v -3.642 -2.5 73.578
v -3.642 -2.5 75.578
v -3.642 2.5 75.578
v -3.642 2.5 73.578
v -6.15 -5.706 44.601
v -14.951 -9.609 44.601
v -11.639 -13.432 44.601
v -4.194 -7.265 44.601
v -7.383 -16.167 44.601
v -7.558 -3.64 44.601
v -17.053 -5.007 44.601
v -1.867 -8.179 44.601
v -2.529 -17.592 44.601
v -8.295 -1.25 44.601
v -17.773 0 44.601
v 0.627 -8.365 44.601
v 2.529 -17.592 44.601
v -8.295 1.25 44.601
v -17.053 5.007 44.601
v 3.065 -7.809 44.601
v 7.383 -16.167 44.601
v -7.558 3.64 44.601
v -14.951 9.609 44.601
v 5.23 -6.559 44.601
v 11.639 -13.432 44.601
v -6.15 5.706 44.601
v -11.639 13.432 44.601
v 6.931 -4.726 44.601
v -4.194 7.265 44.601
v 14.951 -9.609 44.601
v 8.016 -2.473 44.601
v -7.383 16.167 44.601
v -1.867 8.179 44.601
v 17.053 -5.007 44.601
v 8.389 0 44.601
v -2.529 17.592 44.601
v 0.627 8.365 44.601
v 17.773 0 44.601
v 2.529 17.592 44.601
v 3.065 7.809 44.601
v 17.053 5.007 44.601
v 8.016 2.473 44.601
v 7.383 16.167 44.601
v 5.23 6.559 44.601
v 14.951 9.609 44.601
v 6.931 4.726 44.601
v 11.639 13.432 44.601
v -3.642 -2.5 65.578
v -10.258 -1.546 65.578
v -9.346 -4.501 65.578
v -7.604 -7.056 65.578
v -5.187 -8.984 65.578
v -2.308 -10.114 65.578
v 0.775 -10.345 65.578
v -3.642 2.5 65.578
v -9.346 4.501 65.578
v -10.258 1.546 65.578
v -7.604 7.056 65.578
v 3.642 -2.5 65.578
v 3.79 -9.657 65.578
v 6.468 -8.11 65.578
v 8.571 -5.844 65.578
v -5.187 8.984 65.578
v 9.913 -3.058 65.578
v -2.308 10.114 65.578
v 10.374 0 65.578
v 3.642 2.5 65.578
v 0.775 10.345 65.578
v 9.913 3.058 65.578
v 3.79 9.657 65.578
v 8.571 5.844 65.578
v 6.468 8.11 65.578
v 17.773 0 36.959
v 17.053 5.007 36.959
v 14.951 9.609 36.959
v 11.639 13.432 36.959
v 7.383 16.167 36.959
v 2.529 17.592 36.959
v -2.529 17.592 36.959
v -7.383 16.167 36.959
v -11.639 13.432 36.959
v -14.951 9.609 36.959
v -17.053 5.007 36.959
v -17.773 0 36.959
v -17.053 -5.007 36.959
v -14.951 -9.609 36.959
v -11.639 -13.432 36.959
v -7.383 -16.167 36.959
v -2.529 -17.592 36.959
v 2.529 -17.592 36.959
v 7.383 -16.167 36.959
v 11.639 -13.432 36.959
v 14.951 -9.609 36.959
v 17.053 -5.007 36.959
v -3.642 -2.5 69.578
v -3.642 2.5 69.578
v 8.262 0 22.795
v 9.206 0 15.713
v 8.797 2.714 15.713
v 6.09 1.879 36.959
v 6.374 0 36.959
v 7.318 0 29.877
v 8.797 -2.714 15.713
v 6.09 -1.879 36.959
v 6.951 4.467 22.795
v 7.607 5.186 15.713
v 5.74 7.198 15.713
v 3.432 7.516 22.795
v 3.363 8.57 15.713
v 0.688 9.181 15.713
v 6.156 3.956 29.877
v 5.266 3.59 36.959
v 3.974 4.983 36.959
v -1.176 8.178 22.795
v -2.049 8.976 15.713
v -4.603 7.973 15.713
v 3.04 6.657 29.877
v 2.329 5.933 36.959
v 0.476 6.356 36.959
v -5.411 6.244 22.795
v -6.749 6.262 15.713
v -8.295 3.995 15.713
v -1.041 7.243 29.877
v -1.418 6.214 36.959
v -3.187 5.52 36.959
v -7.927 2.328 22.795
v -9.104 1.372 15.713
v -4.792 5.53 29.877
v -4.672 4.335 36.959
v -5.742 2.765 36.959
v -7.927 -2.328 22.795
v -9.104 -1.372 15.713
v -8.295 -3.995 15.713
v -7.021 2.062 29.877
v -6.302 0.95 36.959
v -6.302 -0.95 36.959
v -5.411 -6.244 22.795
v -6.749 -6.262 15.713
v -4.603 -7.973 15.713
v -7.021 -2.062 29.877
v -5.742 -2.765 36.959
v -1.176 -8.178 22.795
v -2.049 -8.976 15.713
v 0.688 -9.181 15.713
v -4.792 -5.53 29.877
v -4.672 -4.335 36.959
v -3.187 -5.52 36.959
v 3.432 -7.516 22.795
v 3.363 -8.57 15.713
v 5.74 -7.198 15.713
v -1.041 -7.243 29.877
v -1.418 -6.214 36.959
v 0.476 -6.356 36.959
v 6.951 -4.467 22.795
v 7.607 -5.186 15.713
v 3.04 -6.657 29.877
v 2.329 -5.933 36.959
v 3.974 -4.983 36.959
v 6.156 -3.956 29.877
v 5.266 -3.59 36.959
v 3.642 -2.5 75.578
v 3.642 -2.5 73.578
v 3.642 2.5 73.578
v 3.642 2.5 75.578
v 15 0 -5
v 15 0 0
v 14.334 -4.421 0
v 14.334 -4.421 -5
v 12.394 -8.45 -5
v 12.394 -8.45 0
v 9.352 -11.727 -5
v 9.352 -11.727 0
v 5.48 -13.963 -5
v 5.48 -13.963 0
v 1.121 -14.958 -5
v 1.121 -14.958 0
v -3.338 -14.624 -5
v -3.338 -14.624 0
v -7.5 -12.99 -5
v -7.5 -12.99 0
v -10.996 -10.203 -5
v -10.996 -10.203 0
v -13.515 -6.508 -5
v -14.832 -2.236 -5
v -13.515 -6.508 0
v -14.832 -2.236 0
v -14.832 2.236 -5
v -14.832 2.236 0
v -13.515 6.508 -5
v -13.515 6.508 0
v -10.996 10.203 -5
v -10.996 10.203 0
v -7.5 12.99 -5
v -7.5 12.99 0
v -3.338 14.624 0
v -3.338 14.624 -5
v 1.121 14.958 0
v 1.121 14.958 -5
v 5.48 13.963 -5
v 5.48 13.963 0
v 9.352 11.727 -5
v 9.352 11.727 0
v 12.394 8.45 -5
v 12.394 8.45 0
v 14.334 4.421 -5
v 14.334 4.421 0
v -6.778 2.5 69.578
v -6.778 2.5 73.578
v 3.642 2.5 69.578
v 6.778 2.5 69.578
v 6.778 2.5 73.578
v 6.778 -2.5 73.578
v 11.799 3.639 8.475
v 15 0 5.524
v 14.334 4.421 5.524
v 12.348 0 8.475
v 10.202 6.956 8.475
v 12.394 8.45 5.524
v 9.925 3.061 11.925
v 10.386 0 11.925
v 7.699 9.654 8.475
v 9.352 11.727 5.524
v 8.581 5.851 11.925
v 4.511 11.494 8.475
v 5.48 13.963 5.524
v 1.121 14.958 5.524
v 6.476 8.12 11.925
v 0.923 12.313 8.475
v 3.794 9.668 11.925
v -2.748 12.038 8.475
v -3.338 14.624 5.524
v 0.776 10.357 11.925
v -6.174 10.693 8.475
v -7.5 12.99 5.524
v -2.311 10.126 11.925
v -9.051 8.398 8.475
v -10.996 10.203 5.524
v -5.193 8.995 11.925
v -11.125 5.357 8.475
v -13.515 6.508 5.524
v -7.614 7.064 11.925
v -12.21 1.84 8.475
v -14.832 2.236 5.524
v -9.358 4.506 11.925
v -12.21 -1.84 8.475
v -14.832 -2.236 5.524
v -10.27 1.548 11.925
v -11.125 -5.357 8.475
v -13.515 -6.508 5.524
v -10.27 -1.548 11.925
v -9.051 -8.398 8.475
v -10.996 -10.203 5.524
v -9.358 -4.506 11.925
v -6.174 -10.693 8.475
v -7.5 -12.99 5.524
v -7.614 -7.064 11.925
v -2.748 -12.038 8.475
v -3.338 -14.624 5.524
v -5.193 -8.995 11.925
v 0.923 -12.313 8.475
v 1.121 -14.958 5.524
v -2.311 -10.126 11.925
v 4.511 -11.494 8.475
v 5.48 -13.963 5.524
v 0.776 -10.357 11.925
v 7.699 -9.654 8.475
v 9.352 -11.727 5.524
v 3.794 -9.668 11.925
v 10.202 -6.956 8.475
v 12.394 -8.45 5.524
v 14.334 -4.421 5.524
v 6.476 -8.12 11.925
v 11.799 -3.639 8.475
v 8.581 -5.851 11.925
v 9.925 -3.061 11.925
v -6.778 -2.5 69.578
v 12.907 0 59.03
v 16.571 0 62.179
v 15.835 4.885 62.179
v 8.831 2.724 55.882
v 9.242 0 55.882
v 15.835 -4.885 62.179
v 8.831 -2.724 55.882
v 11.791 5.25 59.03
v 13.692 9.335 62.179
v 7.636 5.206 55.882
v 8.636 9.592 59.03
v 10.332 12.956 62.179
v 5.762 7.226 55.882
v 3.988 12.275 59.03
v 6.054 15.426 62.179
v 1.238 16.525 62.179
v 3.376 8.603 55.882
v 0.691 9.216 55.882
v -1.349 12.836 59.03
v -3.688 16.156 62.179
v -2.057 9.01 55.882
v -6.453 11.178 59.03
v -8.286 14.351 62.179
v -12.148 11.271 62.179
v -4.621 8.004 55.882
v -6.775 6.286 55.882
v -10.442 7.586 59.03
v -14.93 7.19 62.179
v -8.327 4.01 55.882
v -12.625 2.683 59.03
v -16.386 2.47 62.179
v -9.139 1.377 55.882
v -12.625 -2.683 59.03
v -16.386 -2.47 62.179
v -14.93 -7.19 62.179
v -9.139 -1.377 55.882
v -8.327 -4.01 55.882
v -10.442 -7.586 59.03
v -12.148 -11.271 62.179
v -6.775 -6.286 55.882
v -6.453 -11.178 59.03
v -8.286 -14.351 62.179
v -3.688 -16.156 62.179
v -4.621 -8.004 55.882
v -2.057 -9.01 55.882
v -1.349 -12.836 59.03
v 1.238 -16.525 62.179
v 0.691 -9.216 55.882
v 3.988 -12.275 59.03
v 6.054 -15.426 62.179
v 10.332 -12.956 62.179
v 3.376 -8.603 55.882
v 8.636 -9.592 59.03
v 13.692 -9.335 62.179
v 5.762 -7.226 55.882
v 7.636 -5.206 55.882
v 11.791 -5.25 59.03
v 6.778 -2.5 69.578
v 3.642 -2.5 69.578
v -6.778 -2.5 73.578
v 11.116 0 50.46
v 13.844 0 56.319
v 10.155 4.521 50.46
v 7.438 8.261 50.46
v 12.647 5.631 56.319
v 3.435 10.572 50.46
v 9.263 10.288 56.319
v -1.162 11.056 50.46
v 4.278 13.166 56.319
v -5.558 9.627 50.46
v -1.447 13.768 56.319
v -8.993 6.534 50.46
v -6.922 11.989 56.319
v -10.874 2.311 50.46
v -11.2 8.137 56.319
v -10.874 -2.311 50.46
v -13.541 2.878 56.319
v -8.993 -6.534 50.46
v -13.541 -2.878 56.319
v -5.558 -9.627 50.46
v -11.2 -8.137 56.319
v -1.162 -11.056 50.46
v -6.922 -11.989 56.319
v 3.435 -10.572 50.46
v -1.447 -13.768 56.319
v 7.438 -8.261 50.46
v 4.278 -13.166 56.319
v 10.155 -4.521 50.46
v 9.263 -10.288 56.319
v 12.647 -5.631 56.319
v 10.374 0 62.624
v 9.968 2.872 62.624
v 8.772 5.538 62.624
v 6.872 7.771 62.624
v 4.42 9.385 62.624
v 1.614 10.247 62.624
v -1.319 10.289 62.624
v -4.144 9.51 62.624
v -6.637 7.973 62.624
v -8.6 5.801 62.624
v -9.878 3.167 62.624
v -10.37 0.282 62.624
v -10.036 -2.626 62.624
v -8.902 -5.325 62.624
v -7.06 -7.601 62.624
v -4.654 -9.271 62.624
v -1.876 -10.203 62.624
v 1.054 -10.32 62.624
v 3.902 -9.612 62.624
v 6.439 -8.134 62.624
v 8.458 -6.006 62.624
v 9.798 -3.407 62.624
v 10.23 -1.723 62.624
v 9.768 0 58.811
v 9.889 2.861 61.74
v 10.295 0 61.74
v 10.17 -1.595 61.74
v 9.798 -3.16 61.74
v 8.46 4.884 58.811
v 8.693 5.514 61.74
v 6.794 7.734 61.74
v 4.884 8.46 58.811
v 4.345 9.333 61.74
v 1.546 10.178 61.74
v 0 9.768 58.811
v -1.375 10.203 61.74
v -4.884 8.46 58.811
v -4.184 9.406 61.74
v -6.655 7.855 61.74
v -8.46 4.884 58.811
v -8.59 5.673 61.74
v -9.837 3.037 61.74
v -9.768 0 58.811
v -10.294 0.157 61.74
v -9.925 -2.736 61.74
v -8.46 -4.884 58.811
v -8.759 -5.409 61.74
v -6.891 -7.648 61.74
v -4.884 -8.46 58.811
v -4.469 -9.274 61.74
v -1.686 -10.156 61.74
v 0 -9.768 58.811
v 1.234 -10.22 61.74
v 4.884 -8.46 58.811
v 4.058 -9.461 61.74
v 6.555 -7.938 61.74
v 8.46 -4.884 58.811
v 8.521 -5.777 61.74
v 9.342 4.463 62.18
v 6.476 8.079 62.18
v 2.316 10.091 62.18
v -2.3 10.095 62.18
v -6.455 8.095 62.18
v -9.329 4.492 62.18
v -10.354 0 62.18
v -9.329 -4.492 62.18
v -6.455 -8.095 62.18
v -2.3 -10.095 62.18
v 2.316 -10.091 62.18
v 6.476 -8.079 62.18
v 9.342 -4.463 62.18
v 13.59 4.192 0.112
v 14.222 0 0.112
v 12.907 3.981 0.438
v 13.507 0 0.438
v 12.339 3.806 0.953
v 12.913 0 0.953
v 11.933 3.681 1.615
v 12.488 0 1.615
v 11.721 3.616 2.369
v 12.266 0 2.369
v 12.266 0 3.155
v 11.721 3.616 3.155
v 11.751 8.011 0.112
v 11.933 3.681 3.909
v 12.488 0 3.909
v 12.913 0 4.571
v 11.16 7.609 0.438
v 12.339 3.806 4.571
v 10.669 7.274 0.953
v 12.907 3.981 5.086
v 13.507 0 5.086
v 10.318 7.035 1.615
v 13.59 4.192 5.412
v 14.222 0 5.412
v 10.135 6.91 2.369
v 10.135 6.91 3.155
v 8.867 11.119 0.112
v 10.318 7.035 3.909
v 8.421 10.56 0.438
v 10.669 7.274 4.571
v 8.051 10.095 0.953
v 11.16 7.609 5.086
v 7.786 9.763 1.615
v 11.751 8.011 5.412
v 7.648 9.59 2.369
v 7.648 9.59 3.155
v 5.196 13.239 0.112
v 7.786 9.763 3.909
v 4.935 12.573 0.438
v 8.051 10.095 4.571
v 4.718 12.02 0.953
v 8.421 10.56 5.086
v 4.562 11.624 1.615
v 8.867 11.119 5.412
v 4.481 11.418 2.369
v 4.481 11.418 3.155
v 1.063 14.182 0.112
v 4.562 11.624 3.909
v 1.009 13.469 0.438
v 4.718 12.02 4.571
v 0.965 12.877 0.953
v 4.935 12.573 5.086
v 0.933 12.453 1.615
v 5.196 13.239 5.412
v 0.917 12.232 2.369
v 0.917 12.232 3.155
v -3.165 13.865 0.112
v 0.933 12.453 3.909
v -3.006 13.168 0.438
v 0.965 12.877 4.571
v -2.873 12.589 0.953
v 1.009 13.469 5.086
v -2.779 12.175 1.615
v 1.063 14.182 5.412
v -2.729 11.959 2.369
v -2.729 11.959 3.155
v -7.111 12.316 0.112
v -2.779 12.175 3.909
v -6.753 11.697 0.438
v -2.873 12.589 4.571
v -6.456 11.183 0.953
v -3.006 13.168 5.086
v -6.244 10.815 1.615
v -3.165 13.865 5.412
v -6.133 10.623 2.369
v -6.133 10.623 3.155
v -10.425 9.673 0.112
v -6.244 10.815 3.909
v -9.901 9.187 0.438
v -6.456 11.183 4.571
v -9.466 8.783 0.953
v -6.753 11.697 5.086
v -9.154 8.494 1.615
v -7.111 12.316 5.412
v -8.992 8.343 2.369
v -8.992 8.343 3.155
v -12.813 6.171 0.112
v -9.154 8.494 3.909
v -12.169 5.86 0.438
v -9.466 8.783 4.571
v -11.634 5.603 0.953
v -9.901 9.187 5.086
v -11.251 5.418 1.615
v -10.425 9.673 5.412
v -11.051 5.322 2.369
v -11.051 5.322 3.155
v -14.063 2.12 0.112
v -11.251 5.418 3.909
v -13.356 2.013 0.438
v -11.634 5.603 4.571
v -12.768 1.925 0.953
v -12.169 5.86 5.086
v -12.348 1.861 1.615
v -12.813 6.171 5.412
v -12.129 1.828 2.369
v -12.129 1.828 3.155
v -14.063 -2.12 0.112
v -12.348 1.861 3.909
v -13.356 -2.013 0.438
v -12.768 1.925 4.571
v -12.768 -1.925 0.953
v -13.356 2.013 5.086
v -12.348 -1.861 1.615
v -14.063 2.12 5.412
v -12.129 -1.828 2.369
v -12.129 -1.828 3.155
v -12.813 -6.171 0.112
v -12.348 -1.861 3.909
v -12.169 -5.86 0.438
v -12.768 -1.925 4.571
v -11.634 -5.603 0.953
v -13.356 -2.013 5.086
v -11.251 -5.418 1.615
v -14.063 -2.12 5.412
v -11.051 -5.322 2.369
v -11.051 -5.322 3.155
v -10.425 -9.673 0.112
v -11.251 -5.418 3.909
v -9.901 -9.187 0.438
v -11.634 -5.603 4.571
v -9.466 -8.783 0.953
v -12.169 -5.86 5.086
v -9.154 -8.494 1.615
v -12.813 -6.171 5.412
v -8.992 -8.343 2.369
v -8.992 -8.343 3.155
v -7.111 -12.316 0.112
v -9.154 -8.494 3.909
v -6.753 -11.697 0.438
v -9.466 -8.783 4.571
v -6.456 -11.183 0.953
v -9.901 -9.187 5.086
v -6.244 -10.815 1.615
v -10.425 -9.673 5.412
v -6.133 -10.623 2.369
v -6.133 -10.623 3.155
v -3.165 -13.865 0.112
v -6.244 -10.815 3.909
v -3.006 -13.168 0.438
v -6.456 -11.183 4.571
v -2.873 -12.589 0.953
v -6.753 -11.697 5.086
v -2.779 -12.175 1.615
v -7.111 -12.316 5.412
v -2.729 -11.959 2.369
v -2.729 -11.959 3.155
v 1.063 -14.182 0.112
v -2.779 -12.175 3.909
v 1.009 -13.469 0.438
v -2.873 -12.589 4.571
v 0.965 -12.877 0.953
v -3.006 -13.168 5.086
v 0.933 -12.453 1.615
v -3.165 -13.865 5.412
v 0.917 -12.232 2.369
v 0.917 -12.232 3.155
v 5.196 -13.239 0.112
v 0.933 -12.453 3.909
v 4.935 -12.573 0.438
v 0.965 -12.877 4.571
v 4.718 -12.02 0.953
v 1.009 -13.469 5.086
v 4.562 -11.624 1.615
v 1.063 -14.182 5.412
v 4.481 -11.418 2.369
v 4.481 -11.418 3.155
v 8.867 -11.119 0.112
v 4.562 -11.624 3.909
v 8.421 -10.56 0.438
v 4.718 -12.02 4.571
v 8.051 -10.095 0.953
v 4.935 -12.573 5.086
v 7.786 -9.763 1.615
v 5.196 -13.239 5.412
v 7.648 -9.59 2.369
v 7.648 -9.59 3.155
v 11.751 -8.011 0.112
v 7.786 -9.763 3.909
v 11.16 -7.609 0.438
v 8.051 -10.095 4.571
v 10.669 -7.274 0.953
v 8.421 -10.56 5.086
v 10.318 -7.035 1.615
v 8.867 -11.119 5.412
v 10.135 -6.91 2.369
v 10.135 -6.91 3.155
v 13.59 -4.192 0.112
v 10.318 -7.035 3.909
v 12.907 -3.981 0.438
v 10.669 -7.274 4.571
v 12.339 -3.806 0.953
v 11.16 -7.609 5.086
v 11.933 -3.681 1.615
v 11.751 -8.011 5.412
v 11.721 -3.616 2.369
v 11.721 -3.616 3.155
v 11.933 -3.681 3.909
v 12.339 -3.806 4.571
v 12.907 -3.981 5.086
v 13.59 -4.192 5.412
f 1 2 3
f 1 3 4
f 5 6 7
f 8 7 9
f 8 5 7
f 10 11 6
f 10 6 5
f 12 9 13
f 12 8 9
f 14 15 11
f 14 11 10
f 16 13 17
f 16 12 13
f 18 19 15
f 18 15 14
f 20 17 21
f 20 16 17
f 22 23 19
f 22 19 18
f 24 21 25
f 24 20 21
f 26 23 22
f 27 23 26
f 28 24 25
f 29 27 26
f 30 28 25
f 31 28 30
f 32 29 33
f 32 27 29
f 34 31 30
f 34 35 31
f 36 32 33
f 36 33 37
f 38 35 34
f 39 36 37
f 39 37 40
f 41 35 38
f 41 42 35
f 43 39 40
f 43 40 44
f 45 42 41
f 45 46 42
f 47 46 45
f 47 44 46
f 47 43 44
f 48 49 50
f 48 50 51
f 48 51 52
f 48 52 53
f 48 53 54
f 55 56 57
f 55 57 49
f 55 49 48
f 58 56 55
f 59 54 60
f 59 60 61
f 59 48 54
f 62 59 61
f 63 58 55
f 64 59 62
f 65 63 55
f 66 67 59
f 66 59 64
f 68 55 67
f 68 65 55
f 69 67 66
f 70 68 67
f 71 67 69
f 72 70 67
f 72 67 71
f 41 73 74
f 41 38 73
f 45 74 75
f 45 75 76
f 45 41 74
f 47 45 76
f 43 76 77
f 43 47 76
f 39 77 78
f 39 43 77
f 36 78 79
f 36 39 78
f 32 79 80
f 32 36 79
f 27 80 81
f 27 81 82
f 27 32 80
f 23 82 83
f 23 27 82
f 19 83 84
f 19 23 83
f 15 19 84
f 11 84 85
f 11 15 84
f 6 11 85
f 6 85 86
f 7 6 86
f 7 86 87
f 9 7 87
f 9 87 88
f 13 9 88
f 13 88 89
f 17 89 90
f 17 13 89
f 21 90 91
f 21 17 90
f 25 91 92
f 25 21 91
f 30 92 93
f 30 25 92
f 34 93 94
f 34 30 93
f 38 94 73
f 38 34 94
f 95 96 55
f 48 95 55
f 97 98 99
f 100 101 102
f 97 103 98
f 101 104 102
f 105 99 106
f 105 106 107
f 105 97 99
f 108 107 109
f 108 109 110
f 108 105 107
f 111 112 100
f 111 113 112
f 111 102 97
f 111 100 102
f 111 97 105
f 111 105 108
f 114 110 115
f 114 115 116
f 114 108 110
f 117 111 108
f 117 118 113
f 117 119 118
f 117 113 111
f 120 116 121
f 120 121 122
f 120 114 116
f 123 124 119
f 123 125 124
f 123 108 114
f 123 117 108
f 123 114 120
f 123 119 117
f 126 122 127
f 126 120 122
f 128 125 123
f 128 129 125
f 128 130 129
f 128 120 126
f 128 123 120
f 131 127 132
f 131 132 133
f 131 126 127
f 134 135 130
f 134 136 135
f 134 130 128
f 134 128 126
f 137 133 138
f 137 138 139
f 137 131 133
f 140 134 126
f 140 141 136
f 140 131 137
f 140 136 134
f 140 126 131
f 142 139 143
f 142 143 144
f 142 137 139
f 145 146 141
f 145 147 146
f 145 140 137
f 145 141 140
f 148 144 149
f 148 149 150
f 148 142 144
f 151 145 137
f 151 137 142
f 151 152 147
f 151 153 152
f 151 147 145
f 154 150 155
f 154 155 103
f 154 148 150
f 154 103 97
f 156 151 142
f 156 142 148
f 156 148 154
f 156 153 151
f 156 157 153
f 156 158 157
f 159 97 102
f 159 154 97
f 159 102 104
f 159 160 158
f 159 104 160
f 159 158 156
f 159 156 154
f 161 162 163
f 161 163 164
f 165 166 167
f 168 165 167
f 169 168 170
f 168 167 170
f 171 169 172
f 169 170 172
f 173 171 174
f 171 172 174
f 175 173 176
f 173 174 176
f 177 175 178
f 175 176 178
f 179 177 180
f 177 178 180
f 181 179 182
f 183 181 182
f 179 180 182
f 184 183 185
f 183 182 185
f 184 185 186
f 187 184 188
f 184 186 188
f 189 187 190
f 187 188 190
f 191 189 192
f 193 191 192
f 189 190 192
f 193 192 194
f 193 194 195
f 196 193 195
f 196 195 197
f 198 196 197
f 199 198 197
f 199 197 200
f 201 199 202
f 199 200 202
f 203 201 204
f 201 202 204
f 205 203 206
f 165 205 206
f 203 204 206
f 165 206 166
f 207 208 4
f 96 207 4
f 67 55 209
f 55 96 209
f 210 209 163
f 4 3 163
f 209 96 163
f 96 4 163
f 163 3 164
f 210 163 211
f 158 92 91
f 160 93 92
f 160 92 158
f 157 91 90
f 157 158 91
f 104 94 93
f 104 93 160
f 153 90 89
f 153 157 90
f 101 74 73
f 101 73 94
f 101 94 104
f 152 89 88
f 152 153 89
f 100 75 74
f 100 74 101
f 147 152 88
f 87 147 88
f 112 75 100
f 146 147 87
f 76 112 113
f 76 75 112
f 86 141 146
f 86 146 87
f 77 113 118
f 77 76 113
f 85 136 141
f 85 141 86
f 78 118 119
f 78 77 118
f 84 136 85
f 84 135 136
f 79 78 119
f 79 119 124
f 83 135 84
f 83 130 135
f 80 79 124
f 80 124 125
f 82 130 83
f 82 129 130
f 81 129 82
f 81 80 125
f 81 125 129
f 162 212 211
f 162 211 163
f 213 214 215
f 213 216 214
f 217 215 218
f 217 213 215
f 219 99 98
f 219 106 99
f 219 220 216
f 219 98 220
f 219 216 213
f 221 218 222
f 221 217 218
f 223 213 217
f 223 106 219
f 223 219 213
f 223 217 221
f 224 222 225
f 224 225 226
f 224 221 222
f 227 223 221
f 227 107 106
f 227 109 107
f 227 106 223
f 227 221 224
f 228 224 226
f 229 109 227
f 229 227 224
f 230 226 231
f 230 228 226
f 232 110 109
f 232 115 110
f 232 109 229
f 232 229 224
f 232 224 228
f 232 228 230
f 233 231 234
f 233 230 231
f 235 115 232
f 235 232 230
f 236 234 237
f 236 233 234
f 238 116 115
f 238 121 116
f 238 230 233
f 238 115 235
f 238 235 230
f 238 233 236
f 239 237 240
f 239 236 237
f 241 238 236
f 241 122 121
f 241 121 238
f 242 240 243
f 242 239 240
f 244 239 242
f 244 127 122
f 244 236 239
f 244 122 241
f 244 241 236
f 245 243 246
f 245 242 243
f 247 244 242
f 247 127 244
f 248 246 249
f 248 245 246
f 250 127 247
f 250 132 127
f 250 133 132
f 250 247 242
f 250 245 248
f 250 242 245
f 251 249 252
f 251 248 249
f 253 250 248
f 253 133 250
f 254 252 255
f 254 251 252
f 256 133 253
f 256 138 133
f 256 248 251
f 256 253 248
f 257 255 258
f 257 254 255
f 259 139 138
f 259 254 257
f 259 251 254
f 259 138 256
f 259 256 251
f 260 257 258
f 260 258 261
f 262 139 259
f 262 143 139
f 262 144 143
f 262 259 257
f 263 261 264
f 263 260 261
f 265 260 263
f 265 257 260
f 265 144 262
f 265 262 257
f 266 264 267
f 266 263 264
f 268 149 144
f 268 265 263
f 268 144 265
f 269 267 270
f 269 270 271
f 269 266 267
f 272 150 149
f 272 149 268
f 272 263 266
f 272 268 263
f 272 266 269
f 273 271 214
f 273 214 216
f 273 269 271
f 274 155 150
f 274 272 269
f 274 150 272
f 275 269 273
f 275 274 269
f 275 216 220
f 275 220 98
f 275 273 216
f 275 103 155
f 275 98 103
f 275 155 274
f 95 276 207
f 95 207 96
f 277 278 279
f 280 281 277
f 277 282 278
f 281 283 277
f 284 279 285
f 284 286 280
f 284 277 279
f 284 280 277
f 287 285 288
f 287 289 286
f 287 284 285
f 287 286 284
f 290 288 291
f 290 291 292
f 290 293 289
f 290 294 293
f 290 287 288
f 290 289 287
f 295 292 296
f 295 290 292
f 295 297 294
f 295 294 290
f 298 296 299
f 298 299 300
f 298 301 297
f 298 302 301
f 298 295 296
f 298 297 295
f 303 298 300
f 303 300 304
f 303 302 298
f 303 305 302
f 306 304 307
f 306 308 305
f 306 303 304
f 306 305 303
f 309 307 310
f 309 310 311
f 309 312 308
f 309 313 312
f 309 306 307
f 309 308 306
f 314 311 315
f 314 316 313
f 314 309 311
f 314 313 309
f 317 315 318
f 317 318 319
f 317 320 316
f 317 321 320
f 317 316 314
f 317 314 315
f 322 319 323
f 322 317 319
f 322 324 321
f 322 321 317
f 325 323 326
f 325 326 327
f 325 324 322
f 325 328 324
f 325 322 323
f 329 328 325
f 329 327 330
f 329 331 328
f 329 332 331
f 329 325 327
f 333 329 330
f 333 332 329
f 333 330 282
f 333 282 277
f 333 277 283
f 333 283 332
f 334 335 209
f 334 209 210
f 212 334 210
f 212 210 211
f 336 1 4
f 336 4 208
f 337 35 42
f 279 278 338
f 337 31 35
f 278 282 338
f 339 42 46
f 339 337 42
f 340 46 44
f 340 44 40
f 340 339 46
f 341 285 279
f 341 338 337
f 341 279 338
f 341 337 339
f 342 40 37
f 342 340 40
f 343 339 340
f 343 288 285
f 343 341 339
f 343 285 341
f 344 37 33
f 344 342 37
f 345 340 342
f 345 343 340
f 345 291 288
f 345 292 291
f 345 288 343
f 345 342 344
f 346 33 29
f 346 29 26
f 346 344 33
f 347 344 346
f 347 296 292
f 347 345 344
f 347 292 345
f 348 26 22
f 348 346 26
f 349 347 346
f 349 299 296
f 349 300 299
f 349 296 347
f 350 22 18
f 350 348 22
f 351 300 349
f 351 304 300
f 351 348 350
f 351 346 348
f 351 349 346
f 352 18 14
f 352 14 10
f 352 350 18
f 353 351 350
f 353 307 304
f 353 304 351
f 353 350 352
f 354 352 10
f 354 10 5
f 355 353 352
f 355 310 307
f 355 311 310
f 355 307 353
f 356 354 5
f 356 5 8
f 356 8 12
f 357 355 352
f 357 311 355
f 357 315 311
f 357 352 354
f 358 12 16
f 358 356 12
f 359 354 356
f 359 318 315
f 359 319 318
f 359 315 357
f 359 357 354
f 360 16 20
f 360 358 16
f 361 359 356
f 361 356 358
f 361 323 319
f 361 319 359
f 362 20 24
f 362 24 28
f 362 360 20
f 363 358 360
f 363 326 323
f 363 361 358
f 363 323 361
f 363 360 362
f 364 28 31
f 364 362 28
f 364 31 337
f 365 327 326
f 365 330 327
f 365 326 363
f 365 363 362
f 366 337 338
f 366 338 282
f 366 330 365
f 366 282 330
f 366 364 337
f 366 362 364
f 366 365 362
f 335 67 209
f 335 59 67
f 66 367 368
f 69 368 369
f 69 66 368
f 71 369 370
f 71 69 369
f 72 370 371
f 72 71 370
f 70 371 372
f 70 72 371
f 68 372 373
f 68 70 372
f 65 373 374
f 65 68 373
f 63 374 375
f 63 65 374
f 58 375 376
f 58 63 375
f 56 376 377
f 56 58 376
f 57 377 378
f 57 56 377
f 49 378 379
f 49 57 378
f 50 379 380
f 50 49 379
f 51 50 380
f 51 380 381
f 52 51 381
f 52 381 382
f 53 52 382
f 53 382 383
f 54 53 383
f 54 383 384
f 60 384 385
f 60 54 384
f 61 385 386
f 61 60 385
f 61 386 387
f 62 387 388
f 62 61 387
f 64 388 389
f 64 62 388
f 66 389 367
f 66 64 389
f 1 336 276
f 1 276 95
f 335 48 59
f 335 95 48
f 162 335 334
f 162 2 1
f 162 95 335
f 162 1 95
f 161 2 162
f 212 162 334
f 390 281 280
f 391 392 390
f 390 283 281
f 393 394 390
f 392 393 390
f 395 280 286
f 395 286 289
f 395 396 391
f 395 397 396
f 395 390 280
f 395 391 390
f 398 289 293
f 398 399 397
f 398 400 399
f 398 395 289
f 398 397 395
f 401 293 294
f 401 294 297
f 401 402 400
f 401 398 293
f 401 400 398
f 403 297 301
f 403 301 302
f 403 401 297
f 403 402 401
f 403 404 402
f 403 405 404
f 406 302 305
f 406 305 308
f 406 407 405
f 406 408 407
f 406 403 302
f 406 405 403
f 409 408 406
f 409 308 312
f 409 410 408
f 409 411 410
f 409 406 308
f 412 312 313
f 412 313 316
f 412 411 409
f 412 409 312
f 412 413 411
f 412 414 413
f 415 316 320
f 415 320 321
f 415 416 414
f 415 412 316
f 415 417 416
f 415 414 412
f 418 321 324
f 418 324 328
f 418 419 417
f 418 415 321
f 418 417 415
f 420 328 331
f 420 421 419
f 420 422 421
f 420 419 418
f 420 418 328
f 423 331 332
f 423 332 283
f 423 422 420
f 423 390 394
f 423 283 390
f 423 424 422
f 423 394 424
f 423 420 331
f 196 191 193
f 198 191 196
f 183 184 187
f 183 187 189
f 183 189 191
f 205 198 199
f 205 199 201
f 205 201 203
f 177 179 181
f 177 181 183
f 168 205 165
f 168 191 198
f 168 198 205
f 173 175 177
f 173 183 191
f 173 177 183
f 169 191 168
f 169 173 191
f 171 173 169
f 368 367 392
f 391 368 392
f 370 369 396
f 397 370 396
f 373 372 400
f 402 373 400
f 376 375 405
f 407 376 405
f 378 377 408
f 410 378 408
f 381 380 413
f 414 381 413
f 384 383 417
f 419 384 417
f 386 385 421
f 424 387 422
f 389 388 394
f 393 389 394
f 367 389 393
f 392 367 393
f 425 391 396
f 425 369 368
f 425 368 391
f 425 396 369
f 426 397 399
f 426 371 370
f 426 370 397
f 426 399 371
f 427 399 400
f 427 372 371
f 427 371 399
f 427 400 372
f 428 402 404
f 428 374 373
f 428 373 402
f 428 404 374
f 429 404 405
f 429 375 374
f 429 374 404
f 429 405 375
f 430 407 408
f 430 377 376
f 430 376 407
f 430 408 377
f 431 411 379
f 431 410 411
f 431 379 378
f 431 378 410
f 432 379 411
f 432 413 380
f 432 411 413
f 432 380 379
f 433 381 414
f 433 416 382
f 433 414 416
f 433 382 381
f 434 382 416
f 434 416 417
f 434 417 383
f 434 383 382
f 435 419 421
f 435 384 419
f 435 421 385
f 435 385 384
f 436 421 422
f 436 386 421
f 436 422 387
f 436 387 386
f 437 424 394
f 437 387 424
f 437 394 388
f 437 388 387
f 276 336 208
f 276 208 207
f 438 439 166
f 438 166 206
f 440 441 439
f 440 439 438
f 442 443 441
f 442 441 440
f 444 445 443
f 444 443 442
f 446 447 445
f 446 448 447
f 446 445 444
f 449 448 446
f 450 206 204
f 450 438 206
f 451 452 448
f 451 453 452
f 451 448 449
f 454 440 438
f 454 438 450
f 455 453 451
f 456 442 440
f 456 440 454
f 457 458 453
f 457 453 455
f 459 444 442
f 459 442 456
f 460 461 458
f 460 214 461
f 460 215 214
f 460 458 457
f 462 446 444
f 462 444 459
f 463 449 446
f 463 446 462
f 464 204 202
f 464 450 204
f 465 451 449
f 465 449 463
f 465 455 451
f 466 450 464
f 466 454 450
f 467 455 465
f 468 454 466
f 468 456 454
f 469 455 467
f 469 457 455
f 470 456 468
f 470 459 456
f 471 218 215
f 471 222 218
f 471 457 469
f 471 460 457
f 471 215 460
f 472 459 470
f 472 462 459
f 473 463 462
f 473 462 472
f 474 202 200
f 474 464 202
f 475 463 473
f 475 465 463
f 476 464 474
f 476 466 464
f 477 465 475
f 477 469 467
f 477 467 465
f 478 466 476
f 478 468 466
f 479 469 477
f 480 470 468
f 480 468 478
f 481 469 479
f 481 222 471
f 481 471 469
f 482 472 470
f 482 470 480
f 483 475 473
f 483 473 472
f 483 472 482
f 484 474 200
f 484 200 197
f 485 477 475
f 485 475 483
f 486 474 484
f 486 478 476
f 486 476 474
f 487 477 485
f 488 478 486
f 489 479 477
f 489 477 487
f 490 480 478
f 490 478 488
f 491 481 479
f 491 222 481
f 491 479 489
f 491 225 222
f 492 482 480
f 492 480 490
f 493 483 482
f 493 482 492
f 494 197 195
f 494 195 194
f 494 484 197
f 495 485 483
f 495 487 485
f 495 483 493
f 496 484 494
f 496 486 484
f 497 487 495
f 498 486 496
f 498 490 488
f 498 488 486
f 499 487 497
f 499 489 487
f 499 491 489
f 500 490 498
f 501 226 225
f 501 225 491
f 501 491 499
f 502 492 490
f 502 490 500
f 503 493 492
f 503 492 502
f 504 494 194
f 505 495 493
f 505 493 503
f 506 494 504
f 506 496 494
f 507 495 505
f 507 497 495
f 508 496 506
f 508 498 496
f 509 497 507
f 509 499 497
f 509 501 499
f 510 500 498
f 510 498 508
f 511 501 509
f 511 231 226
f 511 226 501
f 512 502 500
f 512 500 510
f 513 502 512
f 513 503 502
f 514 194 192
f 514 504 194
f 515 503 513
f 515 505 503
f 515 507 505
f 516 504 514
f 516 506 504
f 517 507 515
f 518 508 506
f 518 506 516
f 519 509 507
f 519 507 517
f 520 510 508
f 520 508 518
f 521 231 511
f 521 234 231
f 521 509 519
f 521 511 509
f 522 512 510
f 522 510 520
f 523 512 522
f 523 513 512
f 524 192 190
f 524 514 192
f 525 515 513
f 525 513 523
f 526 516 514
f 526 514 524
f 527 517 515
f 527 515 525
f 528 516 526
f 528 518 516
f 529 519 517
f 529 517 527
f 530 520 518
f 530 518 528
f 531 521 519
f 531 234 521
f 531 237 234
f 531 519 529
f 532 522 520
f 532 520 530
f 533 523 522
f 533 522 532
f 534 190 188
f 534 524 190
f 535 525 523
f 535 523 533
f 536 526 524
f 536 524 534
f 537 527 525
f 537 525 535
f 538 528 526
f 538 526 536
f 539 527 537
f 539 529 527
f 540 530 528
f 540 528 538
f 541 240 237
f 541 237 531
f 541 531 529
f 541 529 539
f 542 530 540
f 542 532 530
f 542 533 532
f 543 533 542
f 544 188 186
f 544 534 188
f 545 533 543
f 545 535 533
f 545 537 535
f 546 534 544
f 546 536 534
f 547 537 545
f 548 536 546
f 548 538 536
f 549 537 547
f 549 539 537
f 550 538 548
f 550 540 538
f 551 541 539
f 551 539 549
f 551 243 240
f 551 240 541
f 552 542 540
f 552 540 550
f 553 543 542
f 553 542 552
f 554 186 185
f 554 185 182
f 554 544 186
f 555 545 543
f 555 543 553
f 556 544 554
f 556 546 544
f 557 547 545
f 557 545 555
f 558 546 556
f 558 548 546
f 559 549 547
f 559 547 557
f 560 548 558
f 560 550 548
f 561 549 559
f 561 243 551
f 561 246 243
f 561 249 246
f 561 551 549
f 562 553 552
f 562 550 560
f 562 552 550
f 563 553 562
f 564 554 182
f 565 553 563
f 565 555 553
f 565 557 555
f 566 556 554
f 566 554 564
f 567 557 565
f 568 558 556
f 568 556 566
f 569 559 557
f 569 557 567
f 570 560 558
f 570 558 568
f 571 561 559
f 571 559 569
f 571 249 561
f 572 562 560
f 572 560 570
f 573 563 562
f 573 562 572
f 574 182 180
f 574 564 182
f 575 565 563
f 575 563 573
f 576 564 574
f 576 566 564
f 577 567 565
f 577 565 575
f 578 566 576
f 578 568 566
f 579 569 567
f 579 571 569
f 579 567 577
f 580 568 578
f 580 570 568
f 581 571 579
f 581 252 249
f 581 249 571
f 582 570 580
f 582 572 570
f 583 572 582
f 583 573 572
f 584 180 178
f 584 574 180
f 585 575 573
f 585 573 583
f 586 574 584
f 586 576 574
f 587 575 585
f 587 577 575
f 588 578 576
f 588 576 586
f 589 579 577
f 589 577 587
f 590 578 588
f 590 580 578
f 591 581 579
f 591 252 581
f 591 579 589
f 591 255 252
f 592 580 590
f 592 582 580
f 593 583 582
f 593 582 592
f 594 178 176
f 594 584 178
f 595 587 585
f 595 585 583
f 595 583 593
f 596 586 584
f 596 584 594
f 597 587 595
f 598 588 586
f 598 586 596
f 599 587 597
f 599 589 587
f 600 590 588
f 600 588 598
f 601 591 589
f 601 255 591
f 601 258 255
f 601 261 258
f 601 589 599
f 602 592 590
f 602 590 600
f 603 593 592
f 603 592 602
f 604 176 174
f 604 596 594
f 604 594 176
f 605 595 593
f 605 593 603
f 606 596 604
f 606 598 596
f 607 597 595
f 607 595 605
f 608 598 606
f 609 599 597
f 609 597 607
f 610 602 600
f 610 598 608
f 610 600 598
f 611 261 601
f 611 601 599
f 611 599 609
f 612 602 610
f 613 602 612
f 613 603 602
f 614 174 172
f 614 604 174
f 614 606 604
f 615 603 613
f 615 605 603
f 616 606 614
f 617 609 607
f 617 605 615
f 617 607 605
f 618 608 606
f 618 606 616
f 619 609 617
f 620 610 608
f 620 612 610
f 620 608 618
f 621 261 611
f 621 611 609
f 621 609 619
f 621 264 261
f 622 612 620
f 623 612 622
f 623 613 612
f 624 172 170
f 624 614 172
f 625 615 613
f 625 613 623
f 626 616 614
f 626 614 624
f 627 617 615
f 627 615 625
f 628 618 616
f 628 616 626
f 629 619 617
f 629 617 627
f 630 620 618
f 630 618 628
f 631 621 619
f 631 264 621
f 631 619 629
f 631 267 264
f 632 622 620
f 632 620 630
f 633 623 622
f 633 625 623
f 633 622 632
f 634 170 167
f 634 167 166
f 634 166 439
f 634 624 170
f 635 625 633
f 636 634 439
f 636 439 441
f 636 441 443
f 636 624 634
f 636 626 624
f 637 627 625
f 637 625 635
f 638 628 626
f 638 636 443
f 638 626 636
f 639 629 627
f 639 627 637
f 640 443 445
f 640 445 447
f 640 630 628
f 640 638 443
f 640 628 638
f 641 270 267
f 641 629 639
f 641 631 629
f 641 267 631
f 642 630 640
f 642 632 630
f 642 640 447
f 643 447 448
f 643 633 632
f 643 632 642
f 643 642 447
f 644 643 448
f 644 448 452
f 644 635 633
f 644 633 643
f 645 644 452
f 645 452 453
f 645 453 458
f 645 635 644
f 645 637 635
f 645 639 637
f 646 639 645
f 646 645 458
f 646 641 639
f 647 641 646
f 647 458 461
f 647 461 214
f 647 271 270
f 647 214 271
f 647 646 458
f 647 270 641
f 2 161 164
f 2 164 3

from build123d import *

# Parameters (mm, degrees)
F1_FACE_R = 15
F2_DEPTH  = 5
F3_DEPTH  = 2.5
F4_DEPTH  = 2.5
F5_R      = 5


with BuildPart() as f1:
    # F0 (on Front) → F1 (revolve)
    with BuildSketch(Plane.XZ):
        with BuildLine():
            Line((0, 65.57779), (0, 0))
            Line((0, 0), (15, 0))
            ThreePointArc((15, 0), (12.238, 2.762), (15, 5.524))
            ThreePointArc((15, 5.524), (11.27401, 10.147038), (9.206386, 15.713044))
            Line((9.206386, 15.713044), (6.373653, 36.958547))
            Line((6.373653, 36.958547), (17.772784, 36.958547))
            Line((17.772784, 36.958547), (17.772784, 44.600636))
            Line((17.772784, 44.600636), (8.38892, 44.600636))
            Line((8.38892, 44.600636), (16.571492, 62.178511))
            Line((16.571492, 62.178511), (9.241848, 55.88216))
            Line((9.241848, 55.88216), (10.373653, 62.178511))
            Line((10.373653, 62.178511), (10.373653, 65.57779))
            Line((10.373653, 65.57779), (3.642126, 65.57779))
            Line((3.642126, 65.57779), (0, 65.57779))
        make_face()
    revolve(axis=Axis((0, 0, 32.788895), (0, 0, 1)))

    # F1_face (on face) → F2 (join)
    with BuildSketch(Plane(origin=(0, 0, 0), x_dir=(1, 0, 0), z_dir=(0, 0, -1))):
        Circle(F1_FACE_R)
    extrude(amount=F2_DEPTH)

    # F0 (on Front) → F3 (join)
    with BuildSketch(Plane.XZ):
        Polygon((-3.642126, 65.57779), (0, 65.57779), (3.642126, 65.57779), (3.642126, 69.57779), (6.778388, 69.57779), (6.778388, 73.57779), (3.642126, 73.57779), (3.642126, 75.57779), (0, 75.57779), (-3.642126, 75.57779), (-3.642126, 73.57779), (-6.778388, 73.57779), (-6.778388, 69.57779), (-3.642126, 69.57779), align=None)
    extrude(amount=F3_DEPTH)

    # F0 (on Front) → F4 (join)
    with BuildSketch(Plane.XZ):
        Polygon((-3.642126, 65.57779), (0, 65.57779), (3.642126, 65.57779), (3.642126, 69.57779), (6.778388, 69.57779), (6.778388, 73.57779), (3.642126, 73.57779), (3.642126, 75.57779), (0, 75.57779), (-3.642126, 75.57779), (-3.642126, 73.57779), (-6.778388, 73.57779), (-6.778388, 69.57779), (-3.642126, 69.57779), align=None)
    extrude(amount=-F4_DEPTH)

    # F5
    f5_edges = [f1.edges().sort_by_distance(p)[0] for p in [
        (-10.373653, 0, 62.178511),
    ]]
    fillet(f5_edges, radius=F5_R)


solid = f1.part
